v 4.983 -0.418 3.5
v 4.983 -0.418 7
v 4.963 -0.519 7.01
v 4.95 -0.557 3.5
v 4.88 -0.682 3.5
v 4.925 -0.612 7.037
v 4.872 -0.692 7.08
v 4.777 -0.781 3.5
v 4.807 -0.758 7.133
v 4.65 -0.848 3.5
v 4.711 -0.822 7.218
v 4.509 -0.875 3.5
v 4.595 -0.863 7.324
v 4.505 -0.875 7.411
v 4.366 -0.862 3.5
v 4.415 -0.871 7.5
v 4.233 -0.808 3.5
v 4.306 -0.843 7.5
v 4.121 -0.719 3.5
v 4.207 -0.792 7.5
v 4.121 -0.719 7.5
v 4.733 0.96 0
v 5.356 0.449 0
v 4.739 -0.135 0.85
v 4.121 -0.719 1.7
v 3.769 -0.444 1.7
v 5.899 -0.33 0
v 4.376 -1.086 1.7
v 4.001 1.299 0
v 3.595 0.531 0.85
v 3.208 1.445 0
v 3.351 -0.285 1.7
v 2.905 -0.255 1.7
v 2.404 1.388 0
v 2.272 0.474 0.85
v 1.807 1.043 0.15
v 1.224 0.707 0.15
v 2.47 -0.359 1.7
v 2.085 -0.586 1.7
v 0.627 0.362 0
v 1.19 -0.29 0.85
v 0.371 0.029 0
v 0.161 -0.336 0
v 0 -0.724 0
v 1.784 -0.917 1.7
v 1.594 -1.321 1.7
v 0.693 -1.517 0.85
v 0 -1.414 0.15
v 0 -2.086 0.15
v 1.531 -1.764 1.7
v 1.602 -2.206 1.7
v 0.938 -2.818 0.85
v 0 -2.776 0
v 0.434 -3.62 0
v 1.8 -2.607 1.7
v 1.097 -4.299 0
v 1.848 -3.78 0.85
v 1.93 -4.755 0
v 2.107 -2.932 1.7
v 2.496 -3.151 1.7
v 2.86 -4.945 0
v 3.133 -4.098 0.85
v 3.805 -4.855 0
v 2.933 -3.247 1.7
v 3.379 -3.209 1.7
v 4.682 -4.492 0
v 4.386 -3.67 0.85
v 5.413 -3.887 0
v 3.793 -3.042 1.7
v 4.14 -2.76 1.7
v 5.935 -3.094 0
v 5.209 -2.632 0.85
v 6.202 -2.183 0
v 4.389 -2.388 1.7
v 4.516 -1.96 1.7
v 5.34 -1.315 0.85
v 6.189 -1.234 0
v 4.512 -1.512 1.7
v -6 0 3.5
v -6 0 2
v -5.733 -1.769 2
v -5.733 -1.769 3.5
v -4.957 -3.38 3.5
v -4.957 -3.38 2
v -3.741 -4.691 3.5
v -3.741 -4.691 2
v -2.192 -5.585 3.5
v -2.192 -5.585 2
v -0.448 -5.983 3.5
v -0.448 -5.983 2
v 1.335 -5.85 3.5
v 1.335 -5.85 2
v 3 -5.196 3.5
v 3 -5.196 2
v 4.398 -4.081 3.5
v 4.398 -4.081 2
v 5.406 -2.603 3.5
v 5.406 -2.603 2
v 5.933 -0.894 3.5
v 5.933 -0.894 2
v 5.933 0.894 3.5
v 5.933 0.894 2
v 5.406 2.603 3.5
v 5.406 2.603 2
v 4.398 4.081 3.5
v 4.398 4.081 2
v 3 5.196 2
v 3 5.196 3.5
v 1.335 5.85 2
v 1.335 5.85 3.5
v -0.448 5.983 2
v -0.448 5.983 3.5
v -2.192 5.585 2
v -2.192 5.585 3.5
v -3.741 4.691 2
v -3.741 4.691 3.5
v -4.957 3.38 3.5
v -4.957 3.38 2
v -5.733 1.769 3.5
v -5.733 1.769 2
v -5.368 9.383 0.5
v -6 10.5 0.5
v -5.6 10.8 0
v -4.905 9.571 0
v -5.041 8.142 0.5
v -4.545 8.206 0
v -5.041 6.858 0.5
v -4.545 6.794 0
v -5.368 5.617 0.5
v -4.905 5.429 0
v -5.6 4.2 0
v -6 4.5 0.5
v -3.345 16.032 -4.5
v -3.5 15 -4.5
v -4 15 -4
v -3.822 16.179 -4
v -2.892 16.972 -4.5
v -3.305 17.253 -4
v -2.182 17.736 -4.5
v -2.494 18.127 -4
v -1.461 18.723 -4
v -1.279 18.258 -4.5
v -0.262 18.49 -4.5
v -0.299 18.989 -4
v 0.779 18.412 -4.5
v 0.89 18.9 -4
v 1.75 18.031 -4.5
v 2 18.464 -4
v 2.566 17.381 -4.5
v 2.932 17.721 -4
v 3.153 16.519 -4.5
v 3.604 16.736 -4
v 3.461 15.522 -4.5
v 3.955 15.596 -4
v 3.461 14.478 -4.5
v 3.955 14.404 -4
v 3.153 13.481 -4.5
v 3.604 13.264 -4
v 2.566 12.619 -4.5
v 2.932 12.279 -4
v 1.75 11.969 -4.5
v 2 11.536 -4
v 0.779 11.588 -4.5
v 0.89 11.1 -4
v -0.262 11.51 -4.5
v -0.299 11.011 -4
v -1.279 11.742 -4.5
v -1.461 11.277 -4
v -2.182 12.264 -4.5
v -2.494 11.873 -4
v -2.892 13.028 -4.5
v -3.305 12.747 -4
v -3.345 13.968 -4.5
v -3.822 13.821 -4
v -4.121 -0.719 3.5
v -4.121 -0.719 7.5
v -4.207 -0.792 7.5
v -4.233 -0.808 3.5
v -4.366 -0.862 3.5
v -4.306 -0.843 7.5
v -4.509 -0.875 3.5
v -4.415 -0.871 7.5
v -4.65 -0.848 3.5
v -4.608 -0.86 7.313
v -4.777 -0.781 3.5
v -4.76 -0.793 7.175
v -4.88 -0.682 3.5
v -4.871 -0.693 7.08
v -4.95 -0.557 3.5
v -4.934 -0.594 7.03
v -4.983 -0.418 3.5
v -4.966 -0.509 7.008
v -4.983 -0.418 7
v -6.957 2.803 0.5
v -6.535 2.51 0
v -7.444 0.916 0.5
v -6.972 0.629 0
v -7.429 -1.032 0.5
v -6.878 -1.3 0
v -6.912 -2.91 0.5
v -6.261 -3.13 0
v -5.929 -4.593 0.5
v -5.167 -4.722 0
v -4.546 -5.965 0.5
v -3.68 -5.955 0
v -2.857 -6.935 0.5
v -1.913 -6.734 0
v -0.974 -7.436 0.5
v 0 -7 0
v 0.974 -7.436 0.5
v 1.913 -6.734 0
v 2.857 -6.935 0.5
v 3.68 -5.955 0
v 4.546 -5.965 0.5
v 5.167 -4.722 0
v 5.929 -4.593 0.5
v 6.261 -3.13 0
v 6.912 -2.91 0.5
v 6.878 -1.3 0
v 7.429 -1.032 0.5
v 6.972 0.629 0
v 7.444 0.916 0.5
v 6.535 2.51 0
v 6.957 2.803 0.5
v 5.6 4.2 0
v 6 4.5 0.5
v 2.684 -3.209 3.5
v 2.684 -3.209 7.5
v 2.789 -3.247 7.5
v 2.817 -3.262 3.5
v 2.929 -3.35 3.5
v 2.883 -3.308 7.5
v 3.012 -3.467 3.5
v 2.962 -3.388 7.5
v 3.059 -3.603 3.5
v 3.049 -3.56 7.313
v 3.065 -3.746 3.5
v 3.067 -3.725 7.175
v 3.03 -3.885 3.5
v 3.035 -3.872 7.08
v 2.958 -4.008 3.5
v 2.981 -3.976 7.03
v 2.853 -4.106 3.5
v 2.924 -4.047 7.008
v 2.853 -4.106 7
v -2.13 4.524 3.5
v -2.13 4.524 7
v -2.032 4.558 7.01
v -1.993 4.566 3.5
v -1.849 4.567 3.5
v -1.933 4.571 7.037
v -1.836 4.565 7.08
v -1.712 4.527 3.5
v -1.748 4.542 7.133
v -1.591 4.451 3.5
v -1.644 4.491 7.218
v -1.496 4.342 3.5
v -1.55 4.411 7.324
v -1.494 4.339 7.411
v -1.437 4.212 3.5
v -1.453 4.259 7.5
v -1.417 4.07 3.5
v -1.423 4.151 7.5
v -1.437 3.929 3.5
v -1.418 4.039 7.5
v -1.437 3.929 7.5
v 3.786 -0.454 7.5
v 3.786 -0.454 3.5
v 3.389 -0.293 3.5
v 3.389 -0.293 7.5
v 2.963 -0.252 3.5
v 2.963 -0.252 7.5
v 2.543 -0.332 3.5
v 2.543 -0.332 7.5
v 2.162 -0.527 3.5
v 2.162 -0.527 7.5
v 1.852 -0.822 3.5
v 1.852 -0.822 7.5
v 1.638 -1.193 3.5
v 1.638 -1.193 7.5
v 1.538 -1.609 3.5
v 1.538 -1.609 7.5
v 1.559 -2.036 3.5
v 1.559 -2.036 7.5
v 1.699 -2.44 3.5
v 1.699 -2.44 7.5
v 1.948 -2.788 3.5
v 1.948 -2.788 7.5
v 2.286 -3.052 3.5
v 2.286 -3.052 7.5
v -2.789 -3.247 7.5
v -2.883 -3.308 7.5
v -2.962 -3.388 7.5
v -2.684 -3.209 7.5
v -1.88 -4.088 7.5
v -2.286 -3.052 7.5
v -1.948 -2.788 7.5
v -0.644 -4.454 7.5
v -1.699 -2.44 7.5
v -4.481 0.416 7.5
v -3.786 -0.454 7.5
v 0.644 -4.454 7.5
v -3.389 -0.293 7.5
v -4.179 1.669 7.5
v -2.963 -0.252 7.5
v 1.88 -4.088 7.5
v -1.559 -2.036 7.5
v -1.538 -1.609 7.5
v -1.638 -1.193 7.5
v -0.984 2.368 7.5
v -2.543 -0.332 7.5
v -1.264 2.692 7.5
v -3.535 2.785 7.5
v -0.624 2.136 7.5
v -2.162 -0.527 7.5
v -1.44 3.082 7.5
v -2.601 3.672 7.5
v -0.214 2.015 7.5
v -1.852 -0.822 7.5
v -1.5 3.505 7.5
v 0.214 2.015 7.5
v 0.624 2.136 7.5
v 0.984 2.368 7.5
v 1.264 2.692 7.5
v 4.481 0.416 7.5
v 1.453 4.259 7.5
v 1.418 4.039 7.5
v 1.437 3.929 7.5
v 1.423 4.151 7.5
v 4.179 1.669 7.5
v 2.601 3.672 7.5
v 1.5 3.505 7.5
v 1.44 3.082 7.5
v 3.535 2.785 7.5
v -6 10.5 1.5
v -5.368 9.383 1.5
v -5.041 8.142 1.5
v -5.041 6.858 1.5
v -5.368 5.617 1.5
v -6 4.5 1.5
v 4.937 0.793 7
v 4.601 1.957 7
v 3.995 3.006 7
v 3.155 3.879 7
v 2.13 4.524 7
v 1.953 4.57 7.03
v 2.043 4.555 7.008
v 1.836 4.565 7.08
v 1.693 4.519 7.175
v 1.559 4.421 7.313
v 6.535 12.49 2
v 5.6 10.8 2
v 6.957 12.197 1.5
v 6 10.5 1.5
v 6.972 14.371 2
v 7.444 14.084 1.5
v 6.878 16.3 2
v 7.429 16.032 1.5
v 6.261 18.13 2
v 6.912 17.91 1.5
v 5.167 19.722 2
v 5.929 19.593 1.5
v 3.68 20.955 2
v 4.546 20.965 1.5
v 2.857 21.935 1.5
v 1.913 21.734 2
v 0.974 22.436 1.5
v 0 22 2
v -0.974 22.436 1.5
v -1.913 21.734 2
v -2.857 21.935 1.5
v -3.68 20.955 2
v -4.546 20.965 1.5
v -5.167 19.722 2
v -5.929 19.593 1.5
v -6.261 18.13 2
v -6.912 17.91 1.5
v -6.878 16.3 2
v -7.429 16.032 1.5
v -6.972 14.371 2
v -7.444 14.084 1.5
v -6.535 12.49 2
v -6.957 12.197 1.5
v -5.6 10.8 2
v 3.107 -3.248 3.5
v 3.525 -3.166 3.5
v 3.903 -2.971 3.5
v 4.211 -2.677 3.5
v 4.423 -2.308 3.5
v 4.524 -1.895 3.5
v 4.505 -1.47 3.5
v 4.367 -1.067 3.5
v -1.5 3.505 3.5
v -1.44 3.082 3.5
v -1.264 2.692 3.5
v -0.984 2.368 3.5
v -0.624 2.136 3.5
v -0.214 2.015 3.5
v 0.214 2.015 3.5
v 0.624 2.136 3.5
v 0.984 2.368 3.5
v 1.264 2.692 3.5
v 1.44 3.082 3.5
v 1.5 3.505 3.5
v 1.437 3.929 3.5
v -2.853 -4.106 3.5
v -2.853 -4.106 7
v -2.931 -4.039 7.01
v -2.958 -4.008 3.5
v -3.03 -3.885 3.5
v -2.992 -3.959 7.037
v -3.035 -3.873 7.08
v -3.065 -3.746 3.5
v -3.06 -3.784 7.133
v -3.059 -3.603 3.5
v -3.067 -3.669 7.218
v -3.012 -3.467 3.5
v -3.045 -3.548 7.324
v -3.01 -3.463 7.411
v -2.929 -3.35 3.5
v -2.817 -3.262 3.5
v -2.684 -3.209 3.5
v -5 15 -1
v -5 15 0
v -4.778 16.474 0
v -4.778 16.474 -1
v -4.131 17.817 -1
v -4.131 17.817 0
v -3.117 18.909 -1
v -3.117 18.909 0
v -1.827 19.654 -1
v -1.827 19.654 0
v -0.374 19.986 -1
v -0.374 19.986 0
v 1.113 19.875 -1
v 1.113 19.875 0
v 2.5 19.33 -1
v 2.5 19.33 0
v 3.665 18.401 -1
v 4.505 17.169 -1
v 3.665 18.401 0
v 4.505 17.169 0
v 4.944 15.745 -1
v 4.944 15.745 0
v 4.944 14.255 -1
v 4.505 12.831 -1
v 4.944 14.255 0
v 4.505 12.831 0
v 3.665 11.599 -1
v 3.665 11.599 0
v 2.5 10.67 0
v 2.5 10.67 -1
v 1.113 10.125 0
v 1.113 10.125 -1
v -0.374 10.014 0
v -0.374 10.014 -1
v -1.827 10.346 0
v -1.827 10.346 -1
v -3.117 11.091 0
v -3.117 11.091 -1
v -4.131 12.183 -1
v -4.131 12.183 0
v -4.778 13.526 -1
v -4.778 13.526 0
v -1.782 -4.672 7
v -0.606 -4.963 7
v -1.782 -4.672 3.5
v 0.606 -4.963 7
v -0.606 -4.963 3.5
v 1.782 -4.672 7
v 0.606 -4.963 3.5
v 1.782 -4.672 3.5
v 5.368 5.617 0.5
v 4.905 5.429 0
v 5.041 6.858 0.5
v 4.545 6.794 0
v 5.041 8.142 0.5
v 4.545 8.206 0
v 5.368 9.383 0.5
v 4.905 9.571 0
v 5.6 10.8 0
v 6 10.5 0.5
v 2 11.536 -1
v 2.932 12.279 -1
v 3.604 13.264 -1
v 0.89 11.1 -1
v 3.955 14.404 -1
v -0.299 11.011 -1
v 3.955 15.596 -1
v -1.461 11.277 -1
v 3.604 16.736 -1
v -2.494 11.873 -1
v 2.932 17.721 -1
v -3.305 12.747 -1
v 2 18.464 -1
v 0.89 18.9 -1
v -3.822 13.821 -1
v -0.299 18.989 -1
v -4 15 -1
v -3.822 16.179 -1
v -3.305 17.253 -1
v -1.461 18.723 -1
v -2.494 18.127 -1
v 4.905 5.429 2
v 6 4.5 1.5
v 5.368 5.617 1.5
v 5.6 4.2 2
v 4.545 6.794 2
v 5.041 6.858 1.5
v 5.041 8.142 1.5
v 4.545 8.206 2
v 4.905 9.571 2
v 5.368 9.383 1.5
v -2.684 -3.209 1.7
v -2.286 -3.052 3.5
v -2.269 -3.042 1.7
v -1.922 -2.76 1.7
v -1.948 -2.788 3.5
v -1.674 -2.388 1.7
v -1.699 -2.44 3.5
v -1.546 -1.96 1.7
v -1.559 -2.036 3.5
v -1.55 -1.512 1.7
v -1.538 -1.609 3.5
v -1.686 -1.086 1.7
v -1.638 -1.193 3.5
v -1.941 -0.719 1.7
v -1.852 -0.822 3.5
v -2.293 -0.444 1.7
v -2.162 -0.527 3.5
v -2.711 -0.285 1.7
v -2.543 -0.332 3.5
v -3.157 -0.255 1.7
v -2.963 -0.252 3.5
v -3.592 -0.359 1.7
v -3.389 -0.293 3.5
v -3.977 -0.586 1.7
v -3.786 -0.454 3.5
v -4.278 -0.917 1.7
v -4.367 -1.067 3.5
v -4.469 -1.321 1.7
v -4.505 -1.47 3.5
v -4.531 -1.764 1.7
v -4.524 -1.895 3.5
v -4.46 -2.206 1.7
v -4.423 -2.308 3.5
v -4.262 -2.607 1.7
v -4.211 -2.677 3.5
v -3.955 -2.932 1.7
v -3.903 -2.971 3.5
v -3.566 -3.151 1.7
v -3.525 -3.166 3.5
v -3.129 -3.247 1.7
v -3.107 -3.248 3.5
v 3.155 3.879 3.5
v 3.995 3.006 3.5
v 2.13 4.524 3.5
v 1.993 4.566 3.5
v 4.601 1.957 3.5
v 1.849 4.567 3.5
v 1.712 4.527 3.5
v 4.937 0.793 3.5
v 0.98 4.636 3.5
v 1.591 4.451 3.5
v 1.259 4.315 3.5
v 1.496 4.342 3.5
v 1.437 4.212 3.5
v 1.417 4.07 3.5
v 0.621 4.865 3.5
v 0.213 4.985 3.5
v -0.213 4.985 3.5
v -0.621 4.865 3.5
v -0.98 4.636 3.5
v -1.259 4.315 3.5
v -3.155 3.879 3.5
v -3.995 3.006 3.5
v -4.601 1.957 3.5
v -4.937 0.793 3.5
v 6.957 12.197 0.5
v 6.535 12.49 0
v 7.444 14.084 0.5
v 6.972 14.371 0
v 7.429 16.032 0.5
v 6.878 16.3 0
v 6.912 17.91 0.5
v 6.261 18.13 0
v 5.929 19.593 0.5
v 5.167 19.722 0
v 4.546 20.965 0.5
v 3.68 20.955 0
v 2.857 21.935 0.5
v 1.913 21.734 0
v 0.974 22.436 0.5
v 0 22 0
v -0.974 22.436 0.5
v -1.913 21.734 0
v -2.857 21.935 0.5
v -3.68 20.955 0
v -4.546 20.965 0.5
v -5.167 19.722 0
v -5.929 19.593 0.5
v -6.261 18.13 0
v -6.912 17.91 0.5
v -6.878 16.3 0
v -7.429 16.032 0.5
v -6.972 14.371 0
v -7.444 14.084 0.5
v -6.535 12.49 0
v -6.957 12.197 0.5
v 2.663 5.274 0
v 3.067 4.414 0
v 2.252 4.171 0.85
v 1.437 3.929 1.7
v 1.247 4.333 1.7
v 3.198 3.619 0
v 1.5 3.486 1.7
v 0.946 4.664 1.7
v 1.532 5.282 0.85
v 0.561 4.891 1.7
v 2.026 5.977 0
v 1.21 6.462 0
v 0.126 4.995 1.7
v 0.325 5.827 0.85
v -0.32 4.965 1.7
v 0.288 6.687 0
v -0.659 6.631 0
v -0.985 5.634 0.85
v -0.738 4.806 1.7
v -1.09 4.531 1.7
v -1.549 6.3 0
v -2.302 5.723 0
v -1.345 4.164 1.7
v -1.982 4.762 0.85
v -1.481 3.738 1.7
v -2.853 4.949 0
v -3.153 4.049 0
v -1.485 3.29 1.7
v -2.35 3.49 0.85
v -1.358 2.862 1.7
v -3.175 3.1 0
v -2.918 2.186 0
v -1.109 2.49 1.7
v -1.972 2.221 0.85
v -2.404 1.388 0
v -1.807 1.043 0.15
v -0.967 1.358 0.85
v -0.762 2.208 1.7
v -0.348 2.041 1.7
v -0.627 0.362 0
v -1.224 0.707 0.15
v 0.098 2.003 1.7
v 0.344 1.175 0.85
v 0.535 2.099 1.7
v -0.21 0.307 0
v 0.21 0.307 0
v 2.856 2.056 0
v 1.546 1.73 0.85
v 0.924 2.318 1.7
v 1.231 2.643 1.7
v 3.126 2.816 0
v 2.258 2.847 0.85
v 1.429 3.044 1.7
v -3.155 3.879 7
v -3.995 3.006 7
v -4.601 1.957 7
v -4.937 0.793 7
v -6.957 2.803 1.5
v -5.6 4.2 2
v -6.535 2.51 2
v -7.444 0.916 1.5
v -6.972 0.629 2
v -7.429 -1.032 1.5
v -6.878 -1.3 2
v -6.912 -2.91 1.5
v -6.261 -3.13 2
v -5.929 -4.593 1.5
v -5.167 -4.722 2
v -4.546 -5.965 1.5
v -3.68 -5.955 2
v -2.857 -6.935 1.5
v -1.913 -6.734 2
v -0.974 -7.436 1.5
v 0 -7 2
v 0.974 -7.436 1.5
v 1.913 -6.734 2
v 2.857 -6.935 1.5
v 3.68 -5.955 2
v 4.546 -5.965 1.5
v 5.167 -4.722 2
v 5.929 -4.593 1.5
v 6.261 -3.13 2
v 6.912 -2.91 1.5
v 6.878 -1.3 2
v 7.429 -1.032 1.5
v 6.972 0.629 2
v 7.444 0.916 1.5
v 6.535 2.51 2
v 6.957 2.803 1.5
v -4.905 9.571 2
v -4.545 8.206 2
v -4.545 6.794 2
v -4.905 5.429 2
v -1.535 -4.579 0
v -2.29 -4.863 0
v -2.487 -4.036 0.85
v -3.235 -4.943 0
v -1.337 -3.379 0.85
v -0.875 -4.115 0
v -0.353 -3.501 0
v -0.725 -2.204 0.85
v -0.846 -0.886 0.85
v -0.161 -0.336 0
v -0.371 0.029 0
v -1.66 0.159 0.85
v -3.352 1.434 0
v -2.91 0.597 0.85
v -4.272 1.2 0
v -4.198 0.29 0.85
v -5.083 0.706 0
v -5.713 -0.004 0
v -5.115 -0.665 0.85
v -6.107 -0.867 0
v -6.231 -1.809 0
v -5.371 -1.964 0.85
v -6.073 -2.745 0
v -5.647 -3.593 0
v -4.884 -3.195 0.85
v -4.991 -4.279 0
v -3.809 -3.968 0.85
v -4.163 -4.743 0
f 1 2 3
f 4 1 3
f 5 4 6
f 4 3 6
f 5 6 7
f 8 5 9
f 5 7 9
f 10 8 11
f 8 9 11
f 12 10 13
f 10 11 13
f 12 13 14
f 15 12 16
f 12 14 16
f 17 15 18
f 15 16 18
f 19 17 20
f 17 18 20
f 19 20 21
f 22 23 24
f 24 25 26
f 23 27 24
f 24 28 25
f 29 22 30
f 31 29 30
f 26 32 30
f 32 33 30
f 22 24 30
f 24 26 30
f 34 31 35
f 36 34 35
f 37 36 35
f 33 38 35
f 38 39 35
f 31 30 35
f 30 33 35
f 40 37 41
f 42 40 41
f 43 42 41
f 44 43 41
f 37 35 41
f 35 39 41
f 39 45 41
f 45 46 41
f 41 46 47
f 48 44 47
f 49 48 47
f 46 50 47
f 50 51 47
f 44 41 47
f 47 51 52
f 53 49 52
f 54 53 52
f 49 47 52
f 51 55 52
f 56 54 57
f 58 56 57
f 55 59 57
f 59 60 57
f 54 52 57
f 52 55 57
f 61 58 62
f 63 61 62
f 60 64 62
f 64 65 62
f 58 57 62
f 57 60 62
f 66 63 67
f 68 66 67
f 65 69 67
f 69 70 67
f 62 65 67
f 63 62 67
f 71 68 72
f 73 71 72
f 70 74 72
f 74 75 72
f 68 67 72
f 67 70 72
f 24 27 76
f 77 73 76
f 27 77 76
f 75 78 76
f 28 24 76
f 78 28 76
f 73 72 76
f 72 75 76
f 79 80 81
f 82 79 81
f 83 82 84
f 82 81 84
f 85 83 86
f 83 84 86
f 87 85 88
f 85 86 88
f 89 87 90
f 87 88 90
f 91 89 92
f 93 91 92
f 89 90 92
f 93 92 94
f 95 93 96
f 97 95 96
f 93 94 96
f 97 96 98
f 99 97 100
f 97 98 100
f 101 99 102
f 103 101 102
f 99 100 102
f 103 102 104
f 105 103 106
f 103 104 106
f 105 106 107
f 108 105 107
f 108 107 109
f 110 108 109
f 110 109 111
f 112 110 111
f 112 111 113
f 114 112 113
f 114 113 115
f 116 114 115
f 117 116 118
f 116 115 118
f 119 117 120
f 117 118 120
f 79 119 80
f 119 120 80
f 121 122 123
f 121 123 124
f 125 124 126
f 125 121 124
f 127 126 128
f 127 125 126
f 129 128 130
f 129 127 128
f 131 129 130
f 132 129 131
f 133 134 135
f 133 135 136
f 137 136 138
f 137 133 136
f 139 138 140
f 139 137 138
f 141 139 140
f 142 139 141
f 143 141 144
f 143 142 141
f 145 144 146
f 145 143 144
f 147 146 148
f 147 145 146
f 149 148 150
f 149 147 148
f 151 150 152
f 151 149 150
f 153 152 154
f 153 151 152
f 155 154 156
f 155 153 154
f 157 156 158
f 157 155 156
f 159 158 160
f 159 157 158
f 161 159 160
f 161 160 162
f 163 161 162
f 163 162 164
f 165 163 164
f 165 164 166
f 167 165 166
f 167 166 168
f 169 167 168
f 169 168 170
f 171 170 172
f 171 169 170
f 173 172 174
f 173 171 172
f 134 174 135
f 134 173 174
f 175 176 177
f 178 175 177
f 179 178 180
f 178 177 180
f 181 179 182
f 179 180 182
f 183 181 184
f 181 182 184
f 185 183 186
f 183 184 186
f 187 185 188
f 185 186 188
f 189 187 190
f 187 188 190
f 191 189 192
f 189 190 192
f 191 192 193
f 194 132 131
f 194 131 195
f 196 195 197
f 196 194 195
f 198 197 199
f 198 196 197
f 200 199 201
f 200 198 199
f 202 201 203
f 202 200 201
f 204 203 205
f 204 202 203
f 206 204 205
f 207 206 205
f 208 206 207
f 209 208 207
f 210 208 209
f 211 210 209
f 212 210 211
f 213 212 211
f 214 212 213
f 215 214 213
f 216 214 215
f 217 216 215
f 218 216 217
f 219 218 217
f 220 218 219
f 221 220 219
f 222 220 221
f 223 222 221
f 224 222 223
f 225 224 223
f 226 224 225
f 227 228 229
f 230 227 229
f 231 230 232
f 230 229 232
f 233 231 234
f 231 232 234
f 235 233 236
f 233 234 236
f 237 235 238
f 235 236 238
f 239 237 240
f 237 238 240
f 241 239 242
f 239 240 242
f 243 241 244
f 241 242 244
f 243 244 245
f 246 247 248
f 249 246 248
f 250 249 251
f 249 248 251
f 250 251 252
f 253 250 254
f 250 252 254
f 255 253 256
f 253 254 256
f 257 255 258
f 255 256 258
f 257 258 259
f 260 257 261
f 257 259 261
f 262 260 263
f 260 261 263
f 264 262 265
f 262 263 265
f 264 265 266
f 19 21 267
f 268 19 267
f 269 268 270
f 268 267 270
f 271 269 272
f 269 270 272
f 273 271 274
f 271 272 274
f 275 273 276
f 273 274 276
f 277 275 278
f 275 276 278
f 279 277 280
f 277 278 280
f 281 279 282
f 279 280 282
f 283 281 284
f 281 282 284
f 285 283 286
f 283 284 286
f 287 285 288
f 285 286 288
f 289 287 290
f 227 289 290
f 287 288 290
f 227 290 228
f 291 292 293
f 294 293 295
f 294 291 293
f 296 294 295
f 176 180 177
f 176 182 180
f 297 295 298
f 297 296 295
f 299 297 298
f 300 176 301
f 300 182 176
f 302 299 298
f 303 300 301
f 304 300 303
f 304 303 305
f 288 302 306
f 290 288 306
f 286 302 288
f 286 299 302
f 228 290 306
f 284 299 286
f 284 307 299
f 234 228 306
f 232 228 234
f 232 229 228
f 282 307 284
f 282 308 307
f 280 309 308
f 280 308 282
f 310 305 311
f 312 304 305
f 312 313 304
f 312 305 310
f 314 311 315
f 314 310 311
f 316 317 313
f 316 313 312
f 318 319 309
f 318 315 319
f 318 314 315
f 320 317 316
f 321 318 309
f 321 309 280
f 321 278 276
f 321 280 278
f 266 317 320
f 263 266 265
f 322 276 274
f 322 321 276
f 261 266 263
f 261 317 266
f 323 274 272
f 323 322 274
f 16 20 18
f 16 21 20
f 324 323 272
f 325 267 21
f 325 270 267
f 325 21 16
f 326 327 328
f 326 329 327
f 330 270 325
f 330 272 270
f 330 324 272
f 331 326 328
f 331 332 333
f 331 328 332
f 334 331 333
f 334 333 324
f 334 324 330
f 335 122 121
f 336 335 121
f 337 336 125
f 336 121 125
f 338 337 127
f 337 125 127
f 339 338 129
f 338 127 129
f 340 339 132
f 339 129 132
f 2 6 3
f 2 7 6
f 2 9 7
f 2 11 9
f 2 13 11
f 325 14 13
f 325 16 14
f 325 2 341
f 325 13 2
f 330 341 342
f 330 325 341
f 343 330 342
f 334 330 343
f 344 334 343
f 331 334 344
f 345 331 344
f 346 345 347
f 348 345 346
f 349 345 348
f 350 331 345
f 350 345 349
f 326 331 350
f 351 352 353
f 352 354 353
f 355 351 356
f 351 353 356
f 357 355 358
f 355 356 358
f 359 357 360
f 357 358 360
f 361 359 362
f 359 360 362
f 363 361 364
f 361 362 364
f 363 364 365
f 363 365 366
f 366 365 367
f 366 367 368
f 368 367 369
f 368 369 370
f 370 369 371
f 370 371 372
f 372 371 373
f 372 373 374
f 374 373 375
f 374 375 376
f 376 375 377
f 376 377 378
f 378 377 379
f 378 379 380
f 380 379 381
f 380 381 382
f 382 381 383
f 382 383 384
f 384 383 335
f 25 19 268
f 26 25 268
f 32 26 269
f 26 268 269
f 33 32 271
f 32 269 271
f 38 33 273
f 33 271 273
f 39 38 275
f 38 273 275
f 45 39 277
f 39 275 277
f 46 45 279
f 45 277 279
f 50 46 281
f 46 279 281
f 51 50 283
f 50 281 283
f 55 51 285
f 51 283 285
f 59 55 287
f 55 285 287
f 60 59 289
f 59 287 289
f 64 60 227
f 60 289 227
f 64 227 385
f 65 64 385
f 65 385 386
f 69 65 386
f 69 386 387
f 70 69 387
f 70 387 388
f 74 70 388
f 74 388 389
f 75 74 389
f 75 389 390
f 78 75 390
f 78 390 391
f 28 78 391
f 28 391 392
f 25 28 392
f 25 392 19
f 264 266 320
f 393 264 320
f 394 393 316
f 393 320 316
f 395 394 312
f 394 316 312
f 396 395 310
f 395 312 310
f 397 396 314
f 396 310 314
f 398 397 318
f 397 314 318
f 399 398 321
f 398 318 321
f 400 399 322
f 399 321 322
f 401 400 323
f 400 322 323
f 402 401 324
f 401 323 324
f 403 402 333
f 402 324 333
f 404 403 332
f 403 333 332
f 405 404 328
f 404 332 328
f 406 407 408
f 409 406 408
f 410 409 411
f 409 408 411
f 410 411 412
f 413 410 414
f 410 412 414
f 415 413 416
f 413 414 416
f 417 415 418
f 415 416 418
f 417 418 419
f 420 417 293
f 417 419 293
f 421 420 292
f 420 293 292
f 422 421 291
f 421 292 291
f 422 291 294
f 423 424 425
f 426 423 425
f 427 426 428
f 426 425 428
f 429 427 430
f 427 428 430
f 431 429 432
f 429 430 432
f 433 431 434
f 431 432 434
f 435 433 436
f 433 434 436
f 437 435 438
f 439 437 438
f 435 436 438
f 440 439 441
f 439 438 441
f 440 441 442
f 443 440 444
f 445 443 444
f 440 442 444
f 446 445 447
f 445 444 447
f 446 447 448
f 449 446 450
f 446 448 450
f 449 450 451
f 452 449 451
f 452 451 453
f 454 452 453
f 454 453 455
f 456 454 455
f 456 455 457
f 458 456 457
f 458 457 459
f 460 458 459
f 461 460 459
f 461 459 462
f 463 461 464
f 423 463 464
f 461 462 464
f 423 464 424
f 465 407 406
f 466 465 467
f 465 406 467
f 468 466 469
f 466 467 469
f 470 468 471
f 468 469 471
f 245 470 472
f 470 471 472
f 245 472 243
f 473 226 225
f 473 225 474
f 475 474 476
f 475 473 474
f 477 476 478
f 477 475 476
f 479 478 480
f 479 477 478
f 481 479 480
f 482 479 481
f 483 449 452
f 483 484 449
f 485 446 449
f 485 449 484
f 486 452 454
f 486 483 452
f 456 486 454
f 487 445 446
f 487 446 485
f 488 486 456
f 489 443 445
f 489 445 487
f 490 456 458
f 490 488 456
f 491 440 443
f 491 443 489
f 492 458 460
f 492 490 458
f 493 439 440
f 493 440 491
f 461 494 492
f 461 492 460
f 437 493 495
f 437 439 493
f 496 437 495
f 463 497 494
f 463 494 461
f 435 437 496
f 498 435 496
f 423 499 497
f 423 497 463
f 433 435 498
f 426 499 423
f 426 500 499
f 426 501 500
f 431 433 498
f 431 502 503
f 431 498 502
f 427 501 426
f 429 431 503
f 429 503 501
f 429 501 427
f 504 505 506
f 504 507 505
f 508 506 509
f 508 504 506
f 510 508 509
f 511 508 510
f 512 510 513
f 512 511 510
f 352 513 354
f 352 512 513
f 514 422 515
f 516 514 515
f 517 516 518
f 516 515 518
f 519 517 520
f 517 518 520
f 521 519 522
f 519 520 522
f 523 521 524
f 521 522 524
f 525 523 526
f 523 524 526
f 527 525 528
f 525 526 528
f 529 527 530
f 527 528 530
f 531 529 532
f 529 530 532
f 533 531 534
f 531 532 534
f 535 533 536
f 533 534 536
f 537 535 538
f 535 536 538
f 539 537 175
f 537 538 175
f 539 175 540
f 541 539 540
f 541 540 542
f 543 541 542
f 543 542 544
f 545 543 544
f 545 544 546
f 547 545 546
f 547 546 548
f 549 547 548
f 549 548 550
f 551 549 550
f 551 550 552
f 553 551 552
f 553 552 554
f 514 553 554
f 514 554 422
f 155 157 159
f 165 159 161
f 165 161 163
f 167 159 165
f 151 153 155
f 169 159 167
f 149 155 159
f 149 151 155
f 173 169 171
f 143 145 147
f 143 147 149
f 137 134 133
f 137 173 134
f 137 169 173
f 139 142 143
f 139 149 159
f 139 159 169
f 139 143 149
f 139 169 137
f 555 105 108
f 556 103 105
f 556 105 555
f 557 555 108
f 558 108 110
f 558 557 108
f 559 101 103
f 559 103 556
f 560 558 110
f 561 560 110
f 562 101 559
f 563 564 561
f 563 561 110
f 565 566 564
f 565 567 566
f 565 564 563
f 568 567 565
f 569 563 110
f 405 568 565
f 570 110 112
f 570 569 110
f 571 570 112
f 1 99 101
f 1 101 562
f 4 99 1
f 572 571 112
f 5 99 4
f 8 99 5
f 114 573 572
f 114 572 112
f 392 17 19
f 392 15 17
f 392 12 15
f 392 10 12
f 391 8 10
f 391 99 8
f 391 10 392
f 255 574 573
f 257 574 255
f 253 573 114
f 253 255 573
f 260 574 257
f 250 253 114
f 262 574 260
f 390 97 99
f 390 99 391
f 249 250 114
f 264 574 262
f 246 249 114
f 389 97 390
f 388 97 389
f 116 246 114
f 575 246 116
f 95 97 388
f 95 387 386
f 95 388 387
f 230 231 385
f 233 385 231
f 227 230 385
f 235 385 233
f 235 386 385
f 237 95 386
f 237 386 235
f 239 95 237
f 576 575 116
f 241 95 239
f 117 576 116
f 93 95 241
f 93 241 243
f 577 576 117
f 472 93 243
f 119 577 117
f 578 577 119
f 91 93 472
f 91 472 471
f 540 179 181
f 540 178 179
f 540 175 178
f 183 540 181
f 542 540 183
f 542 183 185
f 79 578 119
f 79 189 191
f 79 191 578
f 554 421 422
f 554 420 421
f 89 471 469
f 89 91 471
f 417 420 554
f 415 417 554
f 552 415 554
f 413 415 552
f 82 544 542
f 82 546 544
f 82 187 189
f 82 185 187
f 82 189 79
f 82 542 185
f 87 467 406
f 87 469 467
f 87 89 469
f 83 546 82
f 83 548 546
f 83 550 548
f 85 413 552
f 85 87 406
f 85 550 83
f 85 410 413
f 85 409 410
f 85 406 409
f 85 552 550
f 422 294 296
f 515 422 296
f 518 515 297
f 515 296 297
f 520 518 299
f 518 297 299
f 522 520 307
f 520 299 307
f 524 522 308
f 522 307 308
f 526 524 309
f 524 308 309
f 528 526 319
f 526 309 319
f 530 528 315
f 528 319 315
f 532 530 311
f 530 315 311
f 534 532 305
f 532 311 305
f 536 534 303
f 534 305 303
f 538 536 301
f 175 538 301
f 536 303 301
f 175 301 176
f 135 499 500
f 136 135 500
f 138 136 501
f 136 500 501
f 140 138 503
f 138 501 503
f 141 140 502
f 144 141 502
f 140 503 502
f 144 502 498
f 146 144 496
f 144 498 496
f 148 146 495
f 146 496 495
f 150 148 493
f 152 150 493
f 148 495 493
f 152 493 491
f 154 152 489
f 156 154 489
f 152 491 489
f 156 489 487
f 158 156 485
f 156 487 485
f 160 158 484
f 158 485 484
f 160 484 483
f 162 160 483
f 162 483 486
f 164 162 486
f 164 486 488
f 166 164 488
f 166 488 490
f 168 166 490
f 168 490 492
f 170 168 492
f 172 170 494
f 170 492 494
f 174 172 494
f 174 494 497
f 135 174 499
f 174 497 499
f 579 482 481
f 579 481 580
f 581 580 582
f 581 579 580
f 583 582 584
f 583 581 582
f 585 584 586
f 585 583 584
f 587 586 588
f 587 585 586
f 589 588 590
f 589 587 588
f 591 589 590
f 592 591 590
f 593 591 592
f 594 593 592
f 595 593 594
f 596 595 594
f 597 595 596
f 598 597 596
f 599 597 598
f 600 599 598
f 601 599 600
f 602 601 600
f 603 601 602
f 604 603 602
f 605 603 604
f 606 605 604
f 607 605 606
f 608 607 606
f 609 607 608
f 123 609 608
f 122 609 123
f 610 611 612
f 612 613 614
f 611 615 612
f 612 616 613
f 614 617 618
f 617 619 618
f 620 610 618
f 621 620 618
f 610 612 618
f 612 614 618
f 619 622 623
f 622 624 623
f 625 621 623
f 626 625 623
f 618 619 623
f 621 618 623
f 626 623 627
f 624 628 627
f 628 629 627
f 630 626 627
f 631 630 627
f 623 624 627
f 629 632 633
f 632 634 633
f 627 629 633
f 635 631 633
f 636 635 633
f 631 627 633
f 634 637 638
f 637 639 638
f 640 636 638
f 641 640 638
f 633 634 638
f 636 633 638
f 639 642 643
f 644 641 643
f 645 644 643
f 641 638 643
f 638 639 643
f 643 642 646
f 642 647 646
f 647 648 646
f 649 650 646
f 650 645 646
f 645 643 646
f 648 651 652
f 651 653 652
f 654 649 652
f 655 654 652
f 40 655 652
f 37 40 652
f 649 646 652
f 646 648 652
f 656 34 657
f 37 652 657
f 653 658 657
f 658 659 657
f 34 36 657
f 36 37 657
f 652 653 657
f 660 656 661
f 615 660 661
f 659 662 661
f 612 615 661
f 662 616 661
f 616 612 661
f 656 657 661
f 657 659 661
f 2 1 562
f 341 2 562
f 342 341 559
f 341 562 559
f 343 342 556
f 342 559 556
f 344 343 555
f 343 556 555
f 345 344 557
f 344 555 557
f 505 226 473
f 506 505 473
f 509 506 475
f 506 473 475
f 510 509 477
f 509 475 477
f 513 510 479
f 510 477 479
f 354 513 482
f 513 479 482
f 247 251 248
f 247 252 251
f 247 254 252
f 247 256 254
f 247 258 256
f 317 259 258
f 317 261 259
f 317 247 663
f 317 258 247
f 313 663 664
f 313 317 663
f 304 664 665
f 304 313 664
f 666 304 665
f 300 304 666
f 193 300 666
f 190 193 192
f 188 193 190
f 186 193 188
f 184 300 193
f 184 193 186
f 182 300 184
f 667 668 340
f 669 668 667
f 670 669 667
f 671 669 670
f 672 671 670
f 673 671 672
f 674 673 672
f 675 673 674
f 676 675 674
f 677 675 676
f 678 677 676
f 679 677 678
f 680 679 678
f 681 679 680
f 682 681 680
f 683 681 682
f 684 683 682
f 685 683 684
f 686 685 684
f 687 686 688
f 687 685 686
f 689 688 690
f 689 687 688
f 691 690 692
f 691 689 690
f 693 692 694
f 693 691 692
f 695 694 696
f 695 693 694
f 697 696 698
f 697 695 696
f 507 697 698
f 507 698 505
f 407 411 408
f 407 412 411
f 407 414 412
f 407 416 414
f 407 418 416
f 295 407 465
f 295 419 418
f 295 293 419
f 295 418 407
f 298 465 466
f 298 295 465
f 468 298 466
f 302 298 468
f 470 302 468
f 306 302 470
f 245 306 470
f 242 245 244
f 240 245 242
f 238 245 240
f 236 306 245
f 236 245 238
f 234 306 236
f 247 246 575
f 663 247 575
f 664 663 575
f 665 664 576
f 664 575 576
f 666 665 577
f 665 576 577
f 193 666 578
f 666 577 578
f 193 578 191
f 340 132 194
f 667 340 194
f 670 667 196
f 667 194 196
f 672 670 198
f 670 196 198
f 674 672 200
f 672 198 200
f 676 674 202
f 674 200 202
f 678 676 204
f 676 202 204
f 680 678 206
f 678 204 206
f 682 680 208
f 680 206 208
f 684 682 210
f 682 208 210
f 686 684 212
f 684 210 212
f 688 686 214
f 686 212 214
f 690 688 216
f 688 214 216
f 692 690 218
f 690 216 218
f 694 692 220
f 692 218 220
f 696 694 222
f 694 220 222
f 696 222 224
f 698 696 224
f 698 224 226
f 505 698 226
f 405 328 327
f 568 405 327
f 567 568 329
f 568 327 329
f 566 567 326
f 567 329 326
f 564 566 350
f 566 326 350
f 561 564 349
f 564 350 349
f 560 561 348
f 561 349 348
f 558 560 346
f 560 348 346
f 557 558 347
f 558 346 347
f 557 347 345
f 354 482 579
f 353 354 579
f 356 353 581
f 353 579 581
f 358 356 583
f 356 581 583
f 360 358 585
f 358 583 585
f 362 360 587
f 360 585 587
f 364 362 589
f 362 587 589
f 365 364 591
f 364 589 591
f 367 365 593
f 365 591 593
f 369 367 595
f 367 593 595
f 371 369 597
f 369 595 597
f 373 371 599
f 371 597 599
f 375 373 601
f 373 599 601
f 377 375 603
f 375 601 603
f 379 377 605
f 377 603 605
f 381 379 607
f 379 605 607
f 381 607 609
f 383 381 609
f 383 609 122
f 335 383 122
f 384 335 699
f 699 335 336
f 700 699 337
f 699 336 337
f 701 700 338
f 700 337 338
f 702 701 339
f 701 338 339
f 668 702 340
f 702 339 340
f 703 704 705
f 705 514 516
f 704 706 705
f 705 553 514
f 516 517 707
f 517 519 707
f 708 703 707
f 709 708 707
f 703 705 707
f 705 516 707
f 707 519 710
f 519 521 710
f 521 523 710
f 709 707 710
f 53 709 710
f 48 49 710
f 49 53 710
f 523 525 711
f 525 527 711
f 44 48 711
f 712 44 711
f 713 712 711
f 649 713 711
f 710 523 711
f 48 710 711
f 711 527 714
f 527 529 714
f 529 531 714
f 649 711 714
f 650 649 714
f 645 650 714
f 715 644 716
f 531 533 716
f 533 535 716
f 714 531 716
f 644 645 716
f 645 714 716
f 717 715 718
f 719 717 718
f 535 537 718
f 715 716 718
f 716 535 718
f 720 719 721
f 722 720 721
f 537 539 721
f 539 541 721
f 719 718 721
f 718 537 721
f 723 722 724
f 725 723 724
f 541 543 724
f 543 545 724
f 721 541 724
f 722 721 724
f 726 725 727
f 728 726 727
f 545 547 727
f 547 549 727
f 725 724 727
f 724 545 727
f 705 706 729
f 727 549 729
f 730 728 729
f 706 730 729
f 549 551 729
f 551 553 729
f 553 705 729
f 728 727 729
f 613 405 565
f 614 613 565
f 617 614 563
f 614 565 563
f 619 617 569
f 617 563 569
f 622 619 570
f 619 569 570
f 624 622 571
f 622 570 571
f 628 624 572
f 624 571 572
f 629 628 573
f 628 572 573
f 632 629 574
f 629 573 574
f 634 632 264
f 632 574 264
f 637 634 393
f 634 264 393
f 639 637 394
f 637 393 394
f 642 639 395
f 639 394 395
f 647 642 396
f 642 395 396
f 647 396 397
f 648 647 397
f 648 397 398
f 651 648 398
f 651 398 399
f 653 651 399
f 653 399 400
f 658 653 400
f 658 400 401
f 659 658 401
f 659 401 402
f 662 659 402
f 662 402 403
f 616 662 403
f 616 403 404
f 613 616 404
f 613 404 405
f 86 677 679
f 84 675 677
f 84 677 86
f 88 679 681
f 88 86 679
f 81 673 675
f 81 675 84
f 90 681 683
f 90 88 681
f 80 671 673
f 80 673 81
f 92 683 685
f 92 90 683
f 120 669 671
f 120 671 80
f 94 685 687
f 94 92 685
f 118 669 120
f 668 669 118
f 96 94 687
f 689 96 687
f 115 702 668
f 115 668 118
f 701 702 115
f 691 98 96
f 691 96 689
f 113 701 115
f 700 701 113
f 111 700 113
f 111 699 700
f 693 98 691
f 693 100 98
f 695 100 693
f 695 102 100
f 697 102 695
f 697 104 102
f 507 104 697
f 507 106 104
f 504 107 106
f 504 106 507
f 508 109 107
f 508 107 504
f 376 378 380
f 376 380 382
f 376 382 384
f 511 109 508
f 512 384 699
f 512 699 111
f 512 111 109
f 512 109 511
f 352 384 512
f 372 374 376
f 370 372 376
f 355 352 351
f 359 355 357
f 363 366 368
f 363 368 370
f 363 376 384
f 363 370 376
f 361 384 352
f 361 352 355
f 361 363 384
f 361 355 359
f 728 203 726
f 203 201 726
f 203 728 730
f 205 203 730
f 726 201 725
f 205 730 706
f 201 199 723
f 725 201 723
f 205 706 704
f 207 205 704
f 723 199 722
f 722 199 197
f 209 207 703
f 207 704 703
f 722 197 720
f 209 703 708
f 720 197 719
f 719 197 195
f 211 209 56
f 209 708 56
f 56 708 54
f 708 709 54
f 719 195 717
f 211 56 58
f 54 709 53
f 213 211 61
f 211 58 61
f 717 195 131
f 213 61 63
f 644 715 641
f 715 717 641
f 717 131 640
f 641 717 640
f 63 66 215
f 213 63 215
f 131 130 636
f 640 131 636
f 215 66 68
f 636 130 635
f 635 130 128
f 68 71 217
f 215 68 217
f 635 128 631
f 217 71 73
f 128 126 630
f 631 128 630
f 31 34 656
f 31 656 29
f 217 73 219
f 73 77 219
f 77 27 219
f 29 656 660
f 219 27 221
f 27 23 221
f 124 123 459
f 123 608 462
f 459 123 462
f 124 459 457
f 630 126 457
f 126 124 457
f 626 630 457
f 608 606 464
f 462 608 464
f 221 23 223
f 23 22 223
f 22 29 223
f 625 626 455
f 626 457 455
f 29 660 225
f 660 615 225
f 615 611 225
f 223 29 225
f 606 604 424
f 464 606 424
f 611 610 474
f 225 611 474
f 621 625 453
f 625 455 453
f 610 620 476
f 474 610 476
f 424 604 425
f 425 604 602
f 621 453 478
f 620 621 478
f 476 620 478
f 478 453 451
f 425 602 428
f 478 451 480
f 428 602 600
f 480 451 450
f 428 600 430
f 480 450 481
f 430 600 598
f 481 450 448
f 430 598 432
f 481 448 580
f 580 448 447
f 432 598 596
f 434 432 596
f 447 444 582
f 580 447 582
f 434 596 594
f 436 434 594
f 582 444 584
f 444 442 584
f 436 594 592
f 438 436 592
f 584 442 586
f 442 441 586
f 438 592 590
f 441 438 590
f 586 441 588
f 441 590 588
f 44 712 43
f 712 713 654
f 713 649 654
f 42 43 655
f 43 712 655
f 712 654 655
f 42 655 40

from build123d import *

# Parameters (mm, degrees)
EXTRUDE_1_DEPTH     = 2
SKETCH_2_R          = 6
EXTRUDE_2_DEPTH     = 1.5
SKETCH_3_R          = 5
EXTRUDE_3_DEPTH     = 4
SKETCH_4_R          = 5
EXTRUDE_4_DEPTH     = 1
SKETCH_5_R          = 4
EXTRUDE_5_DEPTH     = 3.5
CUT_EXTRUDE_1_DEPTH = 27.58006772
EXTRUDE_START       = -3.5
SKETCH_9_R          = 6
EXTRUDE_6_DEPTH     = 3.5
SKETCH_10_R         = 1.5
CUT_EXTRUDE_2_DEPTH = 26.029982022
CHAMFER_1_SIZE      = 1.7
CHAMFER_2_SIZE      = 0.5
CHAMFER_3_SIZE      = 0.5


with BuildPart() as part:
    # ｽｹｯﾁ1 → ﾎﾞｽ - 押し出し1 (new body)
    with BuildSketch(Plane.XY):
        with BuildLine():
            ThreePointArc((-6, 4.5), (0, -7.5), (6, 4.5))
            ThreePointArc((6, 4.5), (5, 7.5), (6, 10.5))
            ThreePointArc((6, 10.5), (0, 22.5), (-6, 10.5))
            ThreePointArc((-6, 10.5), (-5, 7.5), (-6, 4.5))
        make_face()
    extrude(amount=EXTRUDE_1_DEPTH)

    # ｽｹｯﾁ2 → ﾎﾞｽ - 押し出し2 (add)
    with BuildSketch(Plane.XY.offset(2)):
        with Locations(Location((0, 0, 0), (0, 0, 180))):
            Circle(SKETCH_2_R)
    extrude(amount=EXTRUDE_2_DEPTH)

    # ｽｹｯﾁ3 → ﾎﾞｽ - 押し出し3 (add)
    with BuildSketch(Plane.XY.offset(3.5)):
        Circle(SKETCH_3_R)
    extrude(amount=EXTRUDE_3_DEPTH)

    # ｽｹｯﾁ4 → ﾎﾞｽ - 押し出し4 (add)
    with BuildSketch(Plane(origin=(0, 0, 0), x_dir=(-1, 0, 0), z_dir=(0, 0, -1))):
        with Locations((0, 15)):
            Circle(SKETCH_4_R)
    extrude(amount=EXTRUDE_4_DEPTH)

    # ｽｹｯﾁ5 → ﾎﾞｽ - 押し出し5 (add)
    with BuildSketch(Plane(origin=(0, 0, -1), x_dir=(-1, 0, 0), z_dir=(0, 0, -1))):
        with Locations((0, 15)):
            Circle(SKETCH_5_R)
    extrude(amount=EXTRUDE_5_DEPTH)

    # ｽｹｯﾁ8 → ｶｯﾄ - 押し出し1 (cut, through all)
    with BuildSketch(Plane.XY.offset(7.5)):
        with BuildLine():
            ThreePointArc((-1.437472271, 3.928571429), (0, 2), (1.437472271, 3.928571429))
            ThreePointArc((1.437472271, 3.928571429), (1.590604363, 4.45051627), (2.12958855, 4.523809524))
            ThreePointArc((2.12958855, 4.523809524), (0, 5), (-2.12958855, 4.523809524))
            ThreePointArc((-2.12958855, 4.523809524), (-1.590604363, 4.45051627), (-1.437472271, 3.928571429))
        make_face()
        with BuildLine():
            ThreePointArc((4.120978793, -0.71939821), (1.732050808, -1), (2.683506522, -3.209173218))
            ThreePointArc((2.683506522, -3.209173218), (3.058957968, -3.602761921), (2.852939695, -4.106182546))
            ThreePointArc((2.852939695, -4.106182546), (4.330127019, -2.5), (4.982528245, -0.417626978))
            ThreePointArc((4.982528245, -0.417626978), (4.649562331, -0.847754349), (4.120978793, -0.71939821))
        make_face()
        with BuildLine():
            ThreePointArc((-2.683506522, -3.209173218), (-1.732050808, -1), (-4.120978793, -0.71939821))
            ThreePointArc((-4.120978793, -0.71939821), (-4.649562331, -0.847754349), (-4.982528245, -0.417626978))
            ThreePointArc((-4.982528245, -0.417626978), (-4.330127019, -2.5), (-2.852939695, -4.106182546))
            ThreePointArc((-2.852939695, -4.106182546), (-3.058957968, -3.602761921), (-2.683506522, -3.209173218))
        make_face()
    extrude(amount=-CUT_EXTRUDE_1_DEPTH, mode=Mode.SUBTRACT)

    # ｽｹｯﾁ9 → ﾎﾞｽ - 押し出し6 (add)
    with BuildSketch(Plane.XY.offset(3.5).offset(EXTRUDE_START)):
        with Locations(Location((0, 0, 0), (0, 0, 180))):
            Circle(SKETCH_9_R)
    extrude(amount=EXTRUDE_6_DEPTH)

    # ｽｹｯﾁ10 → ｶｯﾄ - 押し出し2 (cut, through all)
    with BuildSketch(Plane.XY.offset(3.5)):
        with Locations(Location((0, 3.5, 0), (0, 0, 16.601549599))):
            Circle(SKETCH_10_R)
        with Locations(Location((-3.031088913, -1.75, 0), (0, 0, 283.398450401))):
            Circle(SKETCH_10_R)
        with Locations(Location((3.031088913, -1.75, 0), (0, 0, 43.398450401))):
            Circle(SKETCH_10_R)
    extrude(amount=-CUT_EXTRUDE_2_DEPTH, mode=Mode.SUBTRACT)

    # 面取り1
    # the kernel refuses this chamfer: 1.7 mm, written as the material it takes off along each edge
    with BuildSketch(Plane(origin=(0, 3.5, 0), x_dir=(0.9583148475000108, 0.28571428571394725, 0), z_dir=(0.28571428571394725, -0.9583148475000108, 0))) as chamfer_1_piece_1:
        Polygon((1.5 + CHAMFER_1_SIZE, 0), (1.5, CHAMFER_1_SIZE), (1.5, 0), align=None)
    revolve(axis=Axis((0, 3.5, 0), (0, 0, 1)), mode=Mode.SUBTRACT)
    with BuildSketch(Plane(origin=(-3.031088913, -1.75, 0), x_dir=(0.2317215940976018, -0.9727821456157932, 0), z_dir=(-0.9727821456157932, -0.2317215940976018, 0))) as chamfer_1_piece_2:
        Polygon((1.5 + CHAMFER_1_SIZE, 0), (1.5, CHAMFER_1_SIZE), (1.5, 0), align=None)
    revolve(axis=Axis((-3.031088913, -1.75, 0), (0, 0, 1)), mode=Mode.SUBTRACT)
    with BuildSketch(Plane(origin=(3.031088913, -1.75, 0), x_dir=(0.7265932534024093, 0.6870678599018457, 0), z_dir=(0.6870678599018457, -0.7265932534024093, 0))) as chamfer_1_piece_3:
        Polygon((1.5 + CHAMFER_1_SIZE, 0), (1.5, CHAMFER_1_SIZE), (1.5, 0), align=None)
    revolve(axis=Axis((3.031088913, -1.75, 0), (0, 0, 1)), mode=Mode.SUBTRACT)

    # 面取り2
    chamfer_2_edges = [part.edges().sort_by_distance(p)[0] for p in [
        (4, 15, -4.5),
        (0, 22.5, 0),
        (5, 7.5, 0),
        (0, -7.5, 0),
        (-5, 7.5, 0),
    ]]
    chamfer(chamfer_2_edges, length=CHAMFER_2_SIZE)

    # 面取り3
    # the kernel refuses this chamfer: 0.5 mm, written as the material it takes off along each edge
    with BuildSketch(Plane(origin=(10, 7.5, 2), x_dir=(-0.7999999999999996, -0.6000000000000005, 0), z_dir=(0.6000000000000005, -0.7999999999999996, 0))) as chamfer_3_piece_1:
        Polygon((5, CHAMFER_3_SIZE), (5 + CHAMFER_3_SIZE, 0), (5, 0), align=None)
    revolve(axis=Axis((10, 7.5, 2), (0, 0, -1)), revolution_arc=73.739795292, mode=Mode.SUBTRACT)
    with BuildSketch(Plane(origin=(0, 15, 2), x_dir=(0.7999999999999998, -0.6000000000000002, 0), z_dir=(-0.6000000000000002, -0.7999999999999998, 0))) as chamfer_3_piece_2:
        Polygon((7.5 - CHAMFER_3_SIZE, 0), (7.5, -CHAMFER_3_SIZE), (7.5, 0), align=None)
    revolve(axis=Axis((0, 15, 2), (0, 0, 1)), revolution_arc=253.739795292, mode=Mode.SUBTRACT)
    with BuildSketch(Plane(origin=(0, 0, 7.5), x_dir=(-0.18173044344345904, 0.9833483848188515, 0), z_dir=(0.9833483848188515, 0.18173044344345904, 0))) as chamfer_3_piece_3:
        Polygon((5, -CHAMFER_3_SIZE), (5 - CHAMFER_3_SIZE, 0), (5, 0), align=None)
    revolve(axis=Axis((0, 0, 7.5), (0, 0, 1)), revolution_arc=99.05886102, mode=Mode.SUBTRACT)
    with BuildSketch(Plane(origin=(-10, 7.5, 2), x_dir=(0.8, 0.6, 0), z_dir=(-0.6, 0.8, 0))) as chamfer_3_piece_4:
        Polygon((5 + CHAMFER_3_SIZE, 0), (5, CHAMFER_3_SIZE), (5, 0), align=None)
    revolve(axis=Axis((-10, 7.5, 2), (0, 0, -1)), revolution_arc=73.739795292, mode=Mode.SUBTRACT)
    with BuildSketch(Plane(origin=(0, 0, 7.5), x_dir=(0.9424699037452493, -0.3342910117463833, 0), z_dir=(-0.3342910117463833, -0.9424699037452493, 0))) as chamfer_3_piece_5:
        Polygon((5, -CHAMFER_3_SIZE), (5 - CHAMFER_3_SIZE, 0), (5, 0), align=None)
    revolve(axis=Axis((0, 0, 7.5), (0, 0, 1)), revolution_arc=99.05886102, mode=Mode.SUBTRACT)
    with BuildSketch(Plane(origin=(0, 0, 7.5), x_dir=(-0.7607394603017978, -0.6490573730724652, 0), z_dir=(-0.6490573730724652, 0.7607394603017978, 0))) as chamfer_3_piece_6:
        Polygon((5, -CHAMFER_3_SIZE), (5 - CHAMFER_3_SIZE, 0), (5, 0), align=None)
    revolve(axis=Axis((0, 0, 7.5), (0, 0, 1)), revolution_arc=99.05886102, mode=Mode.SUBTRACT)
    with BuildSketch(Plane(origin=(0, 0, 2), x_dir=(-0.7999999999999997, 0.6000000000000003, 0), z_dir=(0.6000000000000003, 0.7999999999999997, 0))) as chamfer_3_piece_7:
        Polygon((7.5, -CHAMFER_3_SIZE), (7.5 - CHAMFER_3_SIZE, 0), (7.5, 0), align=None)
    revolve(axis=Axis((0, 0, 2), (0, 0, 1)), revolution_arc=253.739795292, mode=Mode.SUBTRACT)


solid = part.part
